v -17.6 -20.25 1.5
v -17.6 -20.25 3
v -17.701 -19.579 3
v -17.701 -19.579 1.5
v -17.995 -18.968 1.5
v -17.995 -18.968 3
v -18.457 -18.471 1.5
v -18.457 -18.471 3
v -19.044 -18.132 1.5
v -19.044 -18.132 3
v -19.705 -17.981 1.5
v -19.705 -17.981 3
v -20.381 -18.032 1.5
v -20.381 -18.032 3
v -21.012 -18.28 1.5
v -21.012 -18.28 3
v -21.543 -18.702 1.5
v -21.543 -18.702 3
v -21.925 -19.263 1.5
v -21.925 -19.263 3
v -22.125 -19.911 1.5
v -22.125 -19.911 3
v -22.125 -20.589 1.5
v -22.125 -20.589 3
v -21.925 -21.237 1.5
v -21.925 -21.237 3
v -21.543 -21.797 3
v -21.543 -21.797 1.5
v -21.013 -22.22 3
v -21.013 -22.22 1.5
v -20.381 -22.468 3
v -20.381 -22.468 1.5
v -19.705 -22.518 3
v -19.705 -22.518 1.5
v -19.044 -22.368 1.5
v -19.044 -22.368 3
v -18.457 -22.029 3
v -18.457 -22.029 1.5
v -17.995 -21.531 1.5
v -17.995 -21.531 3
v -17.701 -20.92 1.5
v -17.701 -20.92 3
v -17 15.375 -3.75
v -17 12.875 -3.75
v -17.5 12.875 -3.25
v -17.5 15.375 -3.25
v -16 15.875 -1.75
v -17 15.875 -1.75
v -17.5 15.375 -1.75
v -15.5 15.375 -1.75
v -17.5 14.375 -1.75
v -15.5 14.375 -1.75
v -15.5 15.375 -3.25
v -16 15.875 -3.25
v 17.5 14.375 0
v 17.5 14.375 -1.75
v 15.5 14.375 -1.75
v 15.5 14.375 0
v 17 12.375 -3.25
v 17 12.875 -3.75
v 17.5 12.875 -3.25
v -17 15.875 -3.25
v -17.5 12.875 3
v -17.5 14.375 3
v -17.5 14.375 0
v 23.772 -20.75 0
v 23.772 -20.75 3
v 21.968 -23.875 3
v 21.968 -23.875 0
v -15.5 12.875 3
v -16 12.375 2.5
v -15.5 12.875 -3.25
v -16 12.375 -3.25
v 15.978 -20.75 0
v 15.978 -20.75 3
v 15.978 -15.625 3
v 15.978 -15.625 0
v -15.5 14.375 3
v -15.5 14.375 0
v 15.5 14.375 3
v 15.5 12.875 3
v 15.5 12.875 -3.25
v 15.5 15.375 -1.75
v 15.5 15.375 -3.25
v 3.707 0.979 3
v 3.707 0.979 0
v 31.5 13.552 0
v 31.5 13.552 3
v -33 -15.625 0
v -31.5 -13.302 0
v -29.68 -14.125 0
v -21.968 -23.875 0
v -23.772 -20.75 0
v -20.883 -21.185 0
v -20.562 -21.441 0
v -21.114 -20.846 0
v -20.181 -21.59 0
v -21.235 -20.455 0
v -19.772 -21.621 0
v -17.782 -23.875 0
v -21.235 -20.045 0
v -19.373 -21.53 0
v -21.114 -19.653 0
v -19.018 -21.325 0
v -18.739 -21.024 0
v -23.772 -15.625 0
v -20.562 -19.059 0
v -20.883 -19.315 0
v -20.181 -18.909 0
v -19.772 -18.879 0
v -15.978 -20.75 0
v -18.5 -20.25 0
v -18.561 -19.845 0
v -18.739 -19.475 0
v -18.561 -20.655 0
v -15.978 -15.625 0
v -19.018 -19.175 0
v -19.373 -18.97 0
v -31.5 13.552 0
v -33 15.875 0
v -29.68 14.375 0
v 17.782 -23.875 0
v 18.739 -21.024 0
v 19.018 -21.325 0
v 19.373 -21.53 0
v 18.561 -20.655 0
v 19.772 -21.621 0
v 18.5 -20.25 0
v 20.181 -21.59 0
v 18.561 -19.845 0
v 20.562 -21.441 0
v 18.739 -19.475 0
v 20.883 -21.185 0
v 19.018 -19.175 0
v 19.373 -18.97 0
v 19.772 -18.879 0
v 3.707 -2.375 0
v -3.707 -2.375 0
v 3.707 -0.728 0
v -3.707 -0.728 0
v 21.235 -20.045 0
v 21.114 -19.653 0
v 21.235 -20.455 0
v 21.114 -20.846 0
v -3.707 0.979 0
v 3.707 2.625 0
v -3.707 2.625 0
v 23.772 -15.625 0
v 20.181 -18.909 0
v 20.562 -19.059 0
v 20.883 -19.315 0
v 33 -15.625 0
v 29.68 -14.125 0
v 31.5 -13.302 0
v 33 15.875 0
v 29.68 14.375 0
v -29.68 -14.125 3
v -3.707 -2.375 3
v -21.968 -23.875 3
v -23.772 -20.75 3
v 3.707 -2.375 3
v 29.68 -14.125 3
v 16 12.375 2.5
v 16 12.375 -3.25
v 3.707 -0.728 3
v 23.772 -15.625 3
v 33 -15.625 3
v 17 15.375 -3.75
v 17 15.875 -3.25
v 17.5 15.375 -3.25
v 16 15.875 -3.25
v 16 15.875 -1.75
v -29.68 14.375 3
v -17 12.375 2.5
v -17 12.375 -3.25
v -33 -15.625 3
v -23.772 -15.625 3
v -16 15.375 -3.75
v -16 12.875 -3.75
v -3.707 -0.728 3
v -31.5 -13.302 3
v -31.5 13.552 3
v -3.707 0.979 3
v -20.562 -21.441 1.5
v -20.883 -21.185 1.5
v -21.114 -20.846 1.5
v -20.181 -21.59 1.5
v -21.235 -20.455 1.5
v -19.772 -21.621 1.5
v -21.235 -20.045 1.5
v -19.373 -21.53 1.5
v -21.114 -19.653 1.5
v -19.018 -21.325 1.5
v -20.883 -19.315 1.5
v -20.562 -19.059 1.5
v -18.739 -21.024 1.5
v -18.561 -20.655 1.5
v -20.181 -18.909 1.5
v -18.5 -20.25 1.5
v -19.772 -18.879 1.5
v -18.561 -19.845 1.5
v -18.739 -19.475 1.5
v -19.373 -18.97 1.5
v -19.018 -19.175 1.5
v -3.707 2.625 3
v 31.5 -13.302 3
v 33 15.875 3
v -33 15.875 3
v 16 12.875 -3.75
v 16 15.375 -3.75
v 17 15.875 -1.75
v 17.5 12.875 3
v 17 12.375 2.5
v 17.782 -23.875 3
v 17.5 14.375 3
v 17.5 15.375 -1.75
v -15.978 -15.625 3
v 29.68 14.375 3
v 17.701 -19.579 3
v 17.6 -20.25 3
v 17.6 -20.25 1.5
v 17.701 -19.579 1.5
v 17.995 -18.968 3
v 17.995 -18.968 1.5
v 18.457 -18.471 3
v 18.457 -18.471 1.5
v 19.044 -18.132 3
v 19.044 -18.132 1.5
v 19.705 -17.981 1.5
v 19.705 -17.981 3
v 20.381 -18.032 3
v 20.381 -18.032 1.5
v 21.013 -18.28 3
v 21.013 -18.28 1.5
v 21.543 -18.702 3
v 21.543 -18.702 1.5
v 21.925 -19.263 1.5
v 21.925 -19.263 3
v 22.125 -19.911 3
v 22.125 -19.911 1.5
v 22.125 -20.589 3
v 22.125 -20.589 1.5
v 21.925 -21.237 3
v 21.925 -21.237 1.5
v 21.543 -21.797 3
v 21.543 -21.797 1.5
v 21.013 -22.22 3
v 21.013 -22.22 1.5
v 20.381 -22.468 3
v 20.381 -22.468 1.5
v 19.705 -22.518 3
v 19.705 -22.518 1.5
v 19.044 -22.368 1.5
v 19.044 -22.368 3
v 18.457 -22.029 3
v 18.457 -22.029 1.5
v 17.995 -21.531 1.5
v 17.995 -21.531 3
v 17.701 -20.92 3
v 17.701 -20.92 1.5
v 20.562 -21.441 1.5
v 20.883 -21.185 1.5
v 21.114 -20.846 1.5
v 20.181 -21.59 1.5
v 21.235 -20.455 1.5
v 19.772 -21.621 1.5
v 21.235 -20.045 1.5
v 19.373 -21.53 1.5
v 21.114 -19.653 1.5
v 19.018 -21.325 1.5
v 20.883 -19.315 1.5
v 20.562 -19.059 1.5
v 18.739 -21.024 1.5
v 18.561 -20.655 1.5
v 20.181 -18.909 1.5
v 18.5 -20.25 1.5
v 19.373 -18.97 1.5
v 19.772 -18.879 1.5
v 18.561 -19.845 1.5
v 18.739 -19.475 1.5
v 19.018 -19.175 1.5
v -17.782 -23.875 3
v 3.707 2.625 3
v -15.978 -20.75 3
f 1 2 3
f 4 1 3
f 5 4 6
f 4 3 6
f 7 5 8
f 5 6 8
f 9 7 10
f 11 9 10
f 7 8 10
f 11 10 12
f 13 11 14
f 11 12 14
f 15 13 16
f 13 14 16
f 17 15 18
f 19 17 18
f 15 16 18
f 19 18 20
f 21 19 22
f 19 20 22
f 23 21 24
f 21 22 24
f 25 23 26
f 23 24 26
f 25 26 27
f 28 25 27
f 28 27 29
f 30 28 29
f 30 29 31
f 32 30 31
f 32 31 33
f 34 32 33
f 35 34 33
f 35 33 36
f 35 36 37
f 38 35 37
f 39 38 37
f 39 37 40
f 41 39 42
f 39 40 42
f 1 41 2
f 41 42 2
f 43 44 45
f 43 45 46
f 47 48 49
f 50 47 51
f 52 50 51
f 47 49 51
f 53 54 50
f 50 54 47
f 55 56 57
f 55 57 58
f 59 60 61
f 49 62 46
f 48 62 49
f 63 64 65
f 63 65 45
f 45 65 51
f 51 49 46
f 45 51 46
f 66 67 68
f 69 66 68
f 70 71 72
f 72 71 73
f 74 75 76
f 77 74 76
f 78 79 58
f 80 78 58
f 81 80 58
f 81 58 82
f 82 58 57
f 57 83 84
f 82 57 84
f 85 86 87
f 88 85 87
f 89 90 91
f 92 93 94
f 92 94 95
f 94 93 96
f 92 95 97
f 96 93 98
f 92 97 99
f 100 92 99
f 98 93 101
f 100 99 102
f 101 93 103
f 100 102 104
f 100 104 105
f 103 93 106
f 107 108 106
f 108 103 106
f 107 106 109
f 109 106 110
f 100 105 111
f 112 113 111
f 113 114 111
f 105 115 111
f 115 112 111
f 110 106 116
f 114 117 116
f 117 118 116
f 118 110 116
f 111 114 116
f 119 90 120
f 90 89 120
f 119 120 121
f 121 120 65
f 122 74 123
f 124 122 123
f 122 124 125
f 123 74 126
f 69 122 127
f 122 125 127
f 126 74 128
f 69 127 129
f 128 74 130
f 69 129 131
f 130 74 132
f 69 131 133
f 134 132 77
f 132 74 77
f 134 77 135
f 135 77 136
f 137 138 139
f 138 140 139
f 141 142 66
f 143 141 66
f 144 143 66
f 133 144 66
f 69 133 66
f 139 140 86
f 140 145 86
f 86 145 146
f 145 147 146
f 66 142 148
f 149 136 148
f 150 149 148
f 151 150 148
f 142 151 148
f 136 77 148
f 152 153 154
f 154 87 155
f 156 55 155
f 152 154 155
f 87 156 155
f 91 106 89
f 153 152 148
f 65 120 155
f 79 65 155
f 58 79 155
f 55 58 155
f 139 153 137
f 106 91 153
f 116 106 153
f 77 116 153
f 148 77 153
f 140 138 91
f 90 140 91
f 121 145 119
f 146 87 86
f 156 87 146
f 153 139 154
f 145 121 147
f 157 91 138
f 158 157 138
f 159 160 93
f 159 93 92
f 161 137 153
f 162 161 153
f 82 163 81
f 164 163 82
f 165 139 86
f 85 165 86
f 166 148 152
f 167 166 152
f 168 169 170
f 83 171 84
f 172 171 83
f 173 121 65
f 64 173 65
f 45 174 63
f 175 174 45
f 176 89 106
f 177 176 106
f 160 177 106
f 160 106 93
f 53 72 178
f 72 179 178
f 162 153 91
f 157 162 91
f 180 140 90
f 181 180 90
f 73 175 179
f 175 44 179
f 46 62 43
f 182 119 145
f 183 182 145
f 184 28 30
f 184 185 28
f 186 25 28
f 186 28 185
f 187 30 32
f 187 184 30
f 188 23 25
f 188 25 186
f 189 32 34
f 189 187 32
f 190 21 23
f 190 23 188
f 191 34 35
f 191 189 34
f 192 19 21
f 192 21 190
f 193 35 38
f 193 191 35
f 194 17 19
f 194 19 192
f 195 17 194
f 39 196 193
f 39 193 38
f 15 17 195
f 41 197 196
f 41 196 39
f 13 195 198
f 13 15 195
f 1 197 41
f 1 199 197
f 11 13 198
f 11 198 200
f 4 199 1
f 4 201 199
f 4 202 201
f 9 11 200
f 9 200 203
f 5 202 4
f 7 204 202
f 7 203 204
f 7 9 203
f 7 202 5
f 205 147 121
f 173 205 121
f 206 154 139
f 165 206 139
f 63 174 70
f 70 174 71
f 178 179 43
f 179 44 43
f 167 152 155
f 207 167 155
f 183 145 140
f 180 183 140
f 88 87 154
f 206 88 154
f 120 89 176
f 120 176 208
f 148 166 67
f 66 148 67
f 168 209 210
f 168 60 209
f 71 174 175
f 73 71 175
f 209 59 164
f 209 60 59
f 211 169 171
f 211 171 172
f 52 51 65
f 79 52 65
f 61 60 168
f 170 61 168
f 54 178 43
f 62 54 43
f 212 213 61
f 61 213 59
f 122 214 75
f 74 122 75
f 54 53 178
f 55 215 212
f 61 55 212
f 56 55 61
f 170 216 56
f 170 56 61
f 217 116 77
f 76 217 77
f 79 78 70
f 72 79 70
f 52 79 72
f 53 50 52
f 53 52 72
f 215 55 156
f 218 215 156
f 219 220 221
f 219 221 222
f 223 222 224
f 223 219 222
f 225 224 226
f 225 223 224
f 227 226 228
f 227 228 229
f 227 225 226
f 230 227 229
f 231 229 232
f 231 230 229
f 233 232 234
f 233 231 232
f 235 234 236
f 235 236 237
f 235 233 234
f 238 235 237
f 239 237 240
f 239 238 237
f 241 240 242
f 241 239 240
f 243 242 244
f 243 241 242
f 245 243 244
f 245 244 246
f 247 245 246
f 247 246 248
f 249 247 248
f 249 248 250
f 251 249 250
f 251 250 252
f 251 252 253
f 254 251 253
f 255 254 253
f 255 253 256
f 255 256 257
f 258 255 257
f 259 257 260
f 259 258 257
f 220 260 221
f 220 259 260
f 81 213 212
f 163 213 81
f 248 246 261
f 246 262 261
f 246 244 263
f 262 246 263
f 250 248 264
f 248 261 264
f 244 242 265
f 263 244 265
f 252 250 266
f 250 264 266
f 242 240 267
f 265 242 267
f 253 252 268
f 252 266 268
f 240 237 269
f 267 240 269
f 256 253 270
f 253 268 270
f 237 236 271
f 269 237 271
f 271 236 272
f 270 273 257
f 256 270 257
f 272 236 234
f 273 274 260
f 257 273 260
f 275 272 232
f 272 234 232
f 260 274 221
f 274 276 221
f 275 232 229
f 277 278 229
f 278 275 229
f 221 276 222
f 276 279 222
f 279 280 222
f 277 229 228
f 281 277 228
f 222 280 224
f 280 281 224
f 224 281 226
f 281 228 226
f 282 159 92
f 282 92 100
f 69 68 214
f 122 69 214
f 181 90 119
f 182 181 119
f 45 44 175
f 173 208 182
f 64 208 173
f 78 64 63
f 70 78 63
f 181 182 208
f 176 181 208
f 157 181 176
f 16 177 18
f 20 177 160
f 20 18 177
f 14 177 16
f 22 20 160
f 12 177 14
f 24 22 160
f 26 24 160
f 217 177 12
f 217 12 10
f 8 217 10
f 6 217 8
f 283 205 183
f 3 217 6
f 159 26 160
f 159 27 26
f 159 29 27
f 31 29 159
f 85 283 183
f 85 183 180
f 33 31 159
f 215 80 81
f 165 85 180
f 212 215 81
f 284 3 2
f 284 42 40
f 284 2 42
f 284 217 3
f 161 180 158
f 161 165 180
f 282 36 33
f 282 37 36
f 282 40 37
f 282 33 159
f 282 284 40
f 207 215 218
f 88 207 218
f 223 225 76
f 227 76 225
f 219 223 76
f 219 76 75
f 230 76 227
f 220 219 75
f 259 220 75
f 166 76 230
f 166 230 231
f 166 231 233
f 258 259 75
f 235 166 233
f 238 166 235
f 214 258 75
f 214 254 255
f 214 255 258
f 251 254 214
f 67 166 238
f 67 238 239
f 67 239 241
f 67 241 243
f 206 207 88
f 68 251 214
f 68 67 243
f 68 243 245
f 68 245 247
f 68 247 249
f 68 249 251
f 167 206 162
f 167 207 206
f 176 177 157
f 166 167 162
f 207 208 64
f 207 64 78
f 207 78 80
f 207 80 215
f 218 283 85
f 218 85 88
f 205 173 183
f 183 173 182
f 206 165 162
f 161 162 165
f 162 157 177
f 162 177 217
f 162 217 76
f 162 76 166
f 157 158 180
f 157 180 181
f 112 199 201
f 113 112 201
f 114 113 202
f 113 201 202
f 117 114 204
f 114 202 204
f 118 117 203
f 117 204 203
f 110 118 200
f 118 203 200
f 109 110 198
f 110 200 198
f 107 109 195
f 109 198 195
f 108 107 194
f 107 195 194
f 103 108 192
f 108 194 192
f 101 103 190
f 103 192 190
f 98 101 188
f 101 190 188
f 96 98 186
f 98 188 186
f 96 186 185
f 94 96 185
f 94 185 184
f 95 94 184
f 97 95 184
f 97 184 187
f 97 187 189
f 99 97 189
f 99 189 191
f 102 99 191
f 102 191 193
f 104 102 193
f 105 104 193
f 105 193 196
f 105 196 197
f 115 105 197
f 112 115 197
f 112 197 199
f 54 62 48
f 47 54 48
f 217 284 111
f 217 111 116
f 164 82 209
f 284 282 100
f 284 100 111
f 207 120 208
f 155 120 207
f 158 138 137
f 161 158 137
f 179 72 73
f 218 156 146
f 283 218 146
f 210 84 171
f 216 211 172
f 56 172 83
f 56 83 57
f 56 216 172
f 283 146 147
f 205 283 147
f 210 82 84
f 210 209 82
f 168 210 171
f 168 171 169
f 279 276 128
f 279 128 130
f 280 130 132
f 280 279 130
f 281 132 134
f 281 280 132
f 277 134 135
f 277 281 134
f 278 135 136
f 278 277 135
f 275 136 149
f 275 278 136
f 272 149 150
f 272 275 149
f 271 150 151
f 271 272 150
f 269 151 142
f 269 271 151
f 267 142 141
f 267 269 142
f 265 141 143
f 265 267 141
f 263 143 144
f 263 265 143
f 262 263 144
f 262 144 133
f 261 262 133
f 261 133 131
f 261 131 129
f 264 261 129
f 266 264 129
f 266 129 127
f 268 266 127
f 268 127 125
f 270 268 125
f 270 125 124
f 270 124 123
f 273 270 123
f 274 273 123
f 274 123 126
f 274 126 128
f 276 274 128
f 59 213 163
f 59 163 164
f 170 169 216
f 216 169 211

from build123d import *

# Parameters (mm, degrees)
SKETCH1_W                = 66
SKETCH1_H                = 31.5
BOSS_EXTRUDE1_DEPTH      = 3
SKETCH2_R                = 1.375
BOSS_EXTRUDE2_DEPTH      = 3
SKETCH2_4_R              = 2.275
SKETCH2_4_R_2            = 1.375
CUT_EXTRUDE1_DEPTH       = 1.5
BOSS_EXTRUDE3_DEPTH      = 1
CHAMFER1_SIZE            = 0.5
CHAMFER1_OF_MIRROR2_SIZE = 0.5


with BuildPart() as part:
    # Sketch1 → Boss-Extrude1 (new body)
    with BuildSketch(Plane.XY):
        with Locations((0, 0.125155984)):
            Rectangle(SKETCH1_W, SKETCH1_H)
        Polygon((3.706668857, -2.374844016), (29.680353068, -14.124844016), (-29.680353068, -14.124844016), (-3.706668857, -2.374844016), align=None, mode=Mode.SUBTRACT)
        Polygon((-3.706668857, -0.728496791), (-31.5, -13.301670403), (-31.5, 13.551982372), (-3.706668857, 0.97880876), align=None, mode=Mode.SUBTRACT)
        Polygon((-3.706668857, 2.625155984), (-29.680353068, 14.375155984), (29.680353068, 14.375155984), (3.706668857, 2.625155984), align=None, mode=Mode.SUBTRACT)
        Polygon((3.706668857, 0.97880876), (31.5, 13.551982372), (31.5, -13.301670403), (3.706668857, -0.728496791), align=None, mode=Mode.SUBTRACT)
    extrude(amount=BOSS_EXTRUDE1_DEPTH)

    # Sketch2 → Boss-Extrude2 (add)
    with BuildSketch(Plane.XY.offset(3)):
        Polygon((-15.977885683, -15.624844016), (-23.772114317, -15.624844016), (-23.772114317, -20.749844016), (-21.967894726, -23.874844016), (-17.782105274, -23.874844016), (-15.977885683, -20.749844016), align=None)
        with Locations((-19.875, -20.249844016)):
            Circle(SKETCH2_R, mode=Mode.SUBTRACT)
    boss_extrude2 = extrude(amount=-BOSS_EXTRUDE2_DEPTH)

    # Sketch2<4> → Cut-Extrude1 (cut)
    with BuildSketch(Plane.XY.offset(3)):
        with Locations((-19.875, -20.249844016)):
            Circle(SKETCH2_4_R)
        with Locations((-19.875, -20.249844016)):
            Circle(SKETCH2_4_R_2, mode=Mode.SUBTRACT)
    cut_extrude1 = extrude(amount=-CUT_EXTRUDE1_DEPTH, mode=Mode.SUBTRACT)

    # Mirror1: Boss-Extrude2, Cut-Extrude1 across plane
    add(boss_extrude2.mirror(Plane.ZY))
    add(cut_extrude1.mirror(Plane.ZY), mode=Mode.SUBTRACT)

    # Sketch3 → Boss-Extrude3 (add, symmetric)
    with BuildSketch(Plane.ZY.offset(16.5)):
        Polygon((-1.75, 14.375155984), (3, 14.375155984), (3, 12.375155984), (-3.75, 12.375155984), (-3.75, 15.875155984), (-1.75, 15.875155984), align=None)
    boss_extrude3 = extrude(amount=BOSS_EXTRUDE3_DEPTH, both=True)

    # Chamfer1
    chamfer1_edges = [part.edges().sort_by_distance(p)[0] for p in [
        (-16.5, 12.375155984, 3),
        (-15.5, 15.875155984, -2.75),
        (-15.5, 14.125155984, -3.75),
        (-16.5, 15.875155984, -3.75),
        (-15.5, 12.375155984, -0.375),
        (-16.5, 12.375155984, -3.75),
        (-17.5, 15.875155984, -2.75),
        (-17.5, 14.125155984, -3.75),
        (-17.5, 12.375155984, -0.375),
    ]]
    chamfer(chamfer1_edges, length=CHAMFER1_SIZE)

    # Mirror2: Boss-Extrude3 across plane
    add(boss_extrude3.mirror(Plane.ZY))

    # Chamfer1 of Mirror2
    chamfer1_of_mirror2_edges = [part.edges().sort_by_distance(p)[0] for p in [
        (16.5, 12.375155984, 3),
        (15.5, 15.875155984, -2.75),
        (15.5, 14.125155984, -3.75),
        (16.5, 15.875155984, -3.75),
        (15.5, 12.375155984, -0.375),
        (16.5, 12.375155984, -3.75),
        (17.5, 15.875155984, -2.75),
        (17.5, 14.125155984, -3.75),
        (17.5, 12.375155984, -0.375),
    ]]
    chamfer(chamfer1_of_mirror2_edges, length=CHAMFER1_OF_MIRROR2_SIZE)


solid = part.part
